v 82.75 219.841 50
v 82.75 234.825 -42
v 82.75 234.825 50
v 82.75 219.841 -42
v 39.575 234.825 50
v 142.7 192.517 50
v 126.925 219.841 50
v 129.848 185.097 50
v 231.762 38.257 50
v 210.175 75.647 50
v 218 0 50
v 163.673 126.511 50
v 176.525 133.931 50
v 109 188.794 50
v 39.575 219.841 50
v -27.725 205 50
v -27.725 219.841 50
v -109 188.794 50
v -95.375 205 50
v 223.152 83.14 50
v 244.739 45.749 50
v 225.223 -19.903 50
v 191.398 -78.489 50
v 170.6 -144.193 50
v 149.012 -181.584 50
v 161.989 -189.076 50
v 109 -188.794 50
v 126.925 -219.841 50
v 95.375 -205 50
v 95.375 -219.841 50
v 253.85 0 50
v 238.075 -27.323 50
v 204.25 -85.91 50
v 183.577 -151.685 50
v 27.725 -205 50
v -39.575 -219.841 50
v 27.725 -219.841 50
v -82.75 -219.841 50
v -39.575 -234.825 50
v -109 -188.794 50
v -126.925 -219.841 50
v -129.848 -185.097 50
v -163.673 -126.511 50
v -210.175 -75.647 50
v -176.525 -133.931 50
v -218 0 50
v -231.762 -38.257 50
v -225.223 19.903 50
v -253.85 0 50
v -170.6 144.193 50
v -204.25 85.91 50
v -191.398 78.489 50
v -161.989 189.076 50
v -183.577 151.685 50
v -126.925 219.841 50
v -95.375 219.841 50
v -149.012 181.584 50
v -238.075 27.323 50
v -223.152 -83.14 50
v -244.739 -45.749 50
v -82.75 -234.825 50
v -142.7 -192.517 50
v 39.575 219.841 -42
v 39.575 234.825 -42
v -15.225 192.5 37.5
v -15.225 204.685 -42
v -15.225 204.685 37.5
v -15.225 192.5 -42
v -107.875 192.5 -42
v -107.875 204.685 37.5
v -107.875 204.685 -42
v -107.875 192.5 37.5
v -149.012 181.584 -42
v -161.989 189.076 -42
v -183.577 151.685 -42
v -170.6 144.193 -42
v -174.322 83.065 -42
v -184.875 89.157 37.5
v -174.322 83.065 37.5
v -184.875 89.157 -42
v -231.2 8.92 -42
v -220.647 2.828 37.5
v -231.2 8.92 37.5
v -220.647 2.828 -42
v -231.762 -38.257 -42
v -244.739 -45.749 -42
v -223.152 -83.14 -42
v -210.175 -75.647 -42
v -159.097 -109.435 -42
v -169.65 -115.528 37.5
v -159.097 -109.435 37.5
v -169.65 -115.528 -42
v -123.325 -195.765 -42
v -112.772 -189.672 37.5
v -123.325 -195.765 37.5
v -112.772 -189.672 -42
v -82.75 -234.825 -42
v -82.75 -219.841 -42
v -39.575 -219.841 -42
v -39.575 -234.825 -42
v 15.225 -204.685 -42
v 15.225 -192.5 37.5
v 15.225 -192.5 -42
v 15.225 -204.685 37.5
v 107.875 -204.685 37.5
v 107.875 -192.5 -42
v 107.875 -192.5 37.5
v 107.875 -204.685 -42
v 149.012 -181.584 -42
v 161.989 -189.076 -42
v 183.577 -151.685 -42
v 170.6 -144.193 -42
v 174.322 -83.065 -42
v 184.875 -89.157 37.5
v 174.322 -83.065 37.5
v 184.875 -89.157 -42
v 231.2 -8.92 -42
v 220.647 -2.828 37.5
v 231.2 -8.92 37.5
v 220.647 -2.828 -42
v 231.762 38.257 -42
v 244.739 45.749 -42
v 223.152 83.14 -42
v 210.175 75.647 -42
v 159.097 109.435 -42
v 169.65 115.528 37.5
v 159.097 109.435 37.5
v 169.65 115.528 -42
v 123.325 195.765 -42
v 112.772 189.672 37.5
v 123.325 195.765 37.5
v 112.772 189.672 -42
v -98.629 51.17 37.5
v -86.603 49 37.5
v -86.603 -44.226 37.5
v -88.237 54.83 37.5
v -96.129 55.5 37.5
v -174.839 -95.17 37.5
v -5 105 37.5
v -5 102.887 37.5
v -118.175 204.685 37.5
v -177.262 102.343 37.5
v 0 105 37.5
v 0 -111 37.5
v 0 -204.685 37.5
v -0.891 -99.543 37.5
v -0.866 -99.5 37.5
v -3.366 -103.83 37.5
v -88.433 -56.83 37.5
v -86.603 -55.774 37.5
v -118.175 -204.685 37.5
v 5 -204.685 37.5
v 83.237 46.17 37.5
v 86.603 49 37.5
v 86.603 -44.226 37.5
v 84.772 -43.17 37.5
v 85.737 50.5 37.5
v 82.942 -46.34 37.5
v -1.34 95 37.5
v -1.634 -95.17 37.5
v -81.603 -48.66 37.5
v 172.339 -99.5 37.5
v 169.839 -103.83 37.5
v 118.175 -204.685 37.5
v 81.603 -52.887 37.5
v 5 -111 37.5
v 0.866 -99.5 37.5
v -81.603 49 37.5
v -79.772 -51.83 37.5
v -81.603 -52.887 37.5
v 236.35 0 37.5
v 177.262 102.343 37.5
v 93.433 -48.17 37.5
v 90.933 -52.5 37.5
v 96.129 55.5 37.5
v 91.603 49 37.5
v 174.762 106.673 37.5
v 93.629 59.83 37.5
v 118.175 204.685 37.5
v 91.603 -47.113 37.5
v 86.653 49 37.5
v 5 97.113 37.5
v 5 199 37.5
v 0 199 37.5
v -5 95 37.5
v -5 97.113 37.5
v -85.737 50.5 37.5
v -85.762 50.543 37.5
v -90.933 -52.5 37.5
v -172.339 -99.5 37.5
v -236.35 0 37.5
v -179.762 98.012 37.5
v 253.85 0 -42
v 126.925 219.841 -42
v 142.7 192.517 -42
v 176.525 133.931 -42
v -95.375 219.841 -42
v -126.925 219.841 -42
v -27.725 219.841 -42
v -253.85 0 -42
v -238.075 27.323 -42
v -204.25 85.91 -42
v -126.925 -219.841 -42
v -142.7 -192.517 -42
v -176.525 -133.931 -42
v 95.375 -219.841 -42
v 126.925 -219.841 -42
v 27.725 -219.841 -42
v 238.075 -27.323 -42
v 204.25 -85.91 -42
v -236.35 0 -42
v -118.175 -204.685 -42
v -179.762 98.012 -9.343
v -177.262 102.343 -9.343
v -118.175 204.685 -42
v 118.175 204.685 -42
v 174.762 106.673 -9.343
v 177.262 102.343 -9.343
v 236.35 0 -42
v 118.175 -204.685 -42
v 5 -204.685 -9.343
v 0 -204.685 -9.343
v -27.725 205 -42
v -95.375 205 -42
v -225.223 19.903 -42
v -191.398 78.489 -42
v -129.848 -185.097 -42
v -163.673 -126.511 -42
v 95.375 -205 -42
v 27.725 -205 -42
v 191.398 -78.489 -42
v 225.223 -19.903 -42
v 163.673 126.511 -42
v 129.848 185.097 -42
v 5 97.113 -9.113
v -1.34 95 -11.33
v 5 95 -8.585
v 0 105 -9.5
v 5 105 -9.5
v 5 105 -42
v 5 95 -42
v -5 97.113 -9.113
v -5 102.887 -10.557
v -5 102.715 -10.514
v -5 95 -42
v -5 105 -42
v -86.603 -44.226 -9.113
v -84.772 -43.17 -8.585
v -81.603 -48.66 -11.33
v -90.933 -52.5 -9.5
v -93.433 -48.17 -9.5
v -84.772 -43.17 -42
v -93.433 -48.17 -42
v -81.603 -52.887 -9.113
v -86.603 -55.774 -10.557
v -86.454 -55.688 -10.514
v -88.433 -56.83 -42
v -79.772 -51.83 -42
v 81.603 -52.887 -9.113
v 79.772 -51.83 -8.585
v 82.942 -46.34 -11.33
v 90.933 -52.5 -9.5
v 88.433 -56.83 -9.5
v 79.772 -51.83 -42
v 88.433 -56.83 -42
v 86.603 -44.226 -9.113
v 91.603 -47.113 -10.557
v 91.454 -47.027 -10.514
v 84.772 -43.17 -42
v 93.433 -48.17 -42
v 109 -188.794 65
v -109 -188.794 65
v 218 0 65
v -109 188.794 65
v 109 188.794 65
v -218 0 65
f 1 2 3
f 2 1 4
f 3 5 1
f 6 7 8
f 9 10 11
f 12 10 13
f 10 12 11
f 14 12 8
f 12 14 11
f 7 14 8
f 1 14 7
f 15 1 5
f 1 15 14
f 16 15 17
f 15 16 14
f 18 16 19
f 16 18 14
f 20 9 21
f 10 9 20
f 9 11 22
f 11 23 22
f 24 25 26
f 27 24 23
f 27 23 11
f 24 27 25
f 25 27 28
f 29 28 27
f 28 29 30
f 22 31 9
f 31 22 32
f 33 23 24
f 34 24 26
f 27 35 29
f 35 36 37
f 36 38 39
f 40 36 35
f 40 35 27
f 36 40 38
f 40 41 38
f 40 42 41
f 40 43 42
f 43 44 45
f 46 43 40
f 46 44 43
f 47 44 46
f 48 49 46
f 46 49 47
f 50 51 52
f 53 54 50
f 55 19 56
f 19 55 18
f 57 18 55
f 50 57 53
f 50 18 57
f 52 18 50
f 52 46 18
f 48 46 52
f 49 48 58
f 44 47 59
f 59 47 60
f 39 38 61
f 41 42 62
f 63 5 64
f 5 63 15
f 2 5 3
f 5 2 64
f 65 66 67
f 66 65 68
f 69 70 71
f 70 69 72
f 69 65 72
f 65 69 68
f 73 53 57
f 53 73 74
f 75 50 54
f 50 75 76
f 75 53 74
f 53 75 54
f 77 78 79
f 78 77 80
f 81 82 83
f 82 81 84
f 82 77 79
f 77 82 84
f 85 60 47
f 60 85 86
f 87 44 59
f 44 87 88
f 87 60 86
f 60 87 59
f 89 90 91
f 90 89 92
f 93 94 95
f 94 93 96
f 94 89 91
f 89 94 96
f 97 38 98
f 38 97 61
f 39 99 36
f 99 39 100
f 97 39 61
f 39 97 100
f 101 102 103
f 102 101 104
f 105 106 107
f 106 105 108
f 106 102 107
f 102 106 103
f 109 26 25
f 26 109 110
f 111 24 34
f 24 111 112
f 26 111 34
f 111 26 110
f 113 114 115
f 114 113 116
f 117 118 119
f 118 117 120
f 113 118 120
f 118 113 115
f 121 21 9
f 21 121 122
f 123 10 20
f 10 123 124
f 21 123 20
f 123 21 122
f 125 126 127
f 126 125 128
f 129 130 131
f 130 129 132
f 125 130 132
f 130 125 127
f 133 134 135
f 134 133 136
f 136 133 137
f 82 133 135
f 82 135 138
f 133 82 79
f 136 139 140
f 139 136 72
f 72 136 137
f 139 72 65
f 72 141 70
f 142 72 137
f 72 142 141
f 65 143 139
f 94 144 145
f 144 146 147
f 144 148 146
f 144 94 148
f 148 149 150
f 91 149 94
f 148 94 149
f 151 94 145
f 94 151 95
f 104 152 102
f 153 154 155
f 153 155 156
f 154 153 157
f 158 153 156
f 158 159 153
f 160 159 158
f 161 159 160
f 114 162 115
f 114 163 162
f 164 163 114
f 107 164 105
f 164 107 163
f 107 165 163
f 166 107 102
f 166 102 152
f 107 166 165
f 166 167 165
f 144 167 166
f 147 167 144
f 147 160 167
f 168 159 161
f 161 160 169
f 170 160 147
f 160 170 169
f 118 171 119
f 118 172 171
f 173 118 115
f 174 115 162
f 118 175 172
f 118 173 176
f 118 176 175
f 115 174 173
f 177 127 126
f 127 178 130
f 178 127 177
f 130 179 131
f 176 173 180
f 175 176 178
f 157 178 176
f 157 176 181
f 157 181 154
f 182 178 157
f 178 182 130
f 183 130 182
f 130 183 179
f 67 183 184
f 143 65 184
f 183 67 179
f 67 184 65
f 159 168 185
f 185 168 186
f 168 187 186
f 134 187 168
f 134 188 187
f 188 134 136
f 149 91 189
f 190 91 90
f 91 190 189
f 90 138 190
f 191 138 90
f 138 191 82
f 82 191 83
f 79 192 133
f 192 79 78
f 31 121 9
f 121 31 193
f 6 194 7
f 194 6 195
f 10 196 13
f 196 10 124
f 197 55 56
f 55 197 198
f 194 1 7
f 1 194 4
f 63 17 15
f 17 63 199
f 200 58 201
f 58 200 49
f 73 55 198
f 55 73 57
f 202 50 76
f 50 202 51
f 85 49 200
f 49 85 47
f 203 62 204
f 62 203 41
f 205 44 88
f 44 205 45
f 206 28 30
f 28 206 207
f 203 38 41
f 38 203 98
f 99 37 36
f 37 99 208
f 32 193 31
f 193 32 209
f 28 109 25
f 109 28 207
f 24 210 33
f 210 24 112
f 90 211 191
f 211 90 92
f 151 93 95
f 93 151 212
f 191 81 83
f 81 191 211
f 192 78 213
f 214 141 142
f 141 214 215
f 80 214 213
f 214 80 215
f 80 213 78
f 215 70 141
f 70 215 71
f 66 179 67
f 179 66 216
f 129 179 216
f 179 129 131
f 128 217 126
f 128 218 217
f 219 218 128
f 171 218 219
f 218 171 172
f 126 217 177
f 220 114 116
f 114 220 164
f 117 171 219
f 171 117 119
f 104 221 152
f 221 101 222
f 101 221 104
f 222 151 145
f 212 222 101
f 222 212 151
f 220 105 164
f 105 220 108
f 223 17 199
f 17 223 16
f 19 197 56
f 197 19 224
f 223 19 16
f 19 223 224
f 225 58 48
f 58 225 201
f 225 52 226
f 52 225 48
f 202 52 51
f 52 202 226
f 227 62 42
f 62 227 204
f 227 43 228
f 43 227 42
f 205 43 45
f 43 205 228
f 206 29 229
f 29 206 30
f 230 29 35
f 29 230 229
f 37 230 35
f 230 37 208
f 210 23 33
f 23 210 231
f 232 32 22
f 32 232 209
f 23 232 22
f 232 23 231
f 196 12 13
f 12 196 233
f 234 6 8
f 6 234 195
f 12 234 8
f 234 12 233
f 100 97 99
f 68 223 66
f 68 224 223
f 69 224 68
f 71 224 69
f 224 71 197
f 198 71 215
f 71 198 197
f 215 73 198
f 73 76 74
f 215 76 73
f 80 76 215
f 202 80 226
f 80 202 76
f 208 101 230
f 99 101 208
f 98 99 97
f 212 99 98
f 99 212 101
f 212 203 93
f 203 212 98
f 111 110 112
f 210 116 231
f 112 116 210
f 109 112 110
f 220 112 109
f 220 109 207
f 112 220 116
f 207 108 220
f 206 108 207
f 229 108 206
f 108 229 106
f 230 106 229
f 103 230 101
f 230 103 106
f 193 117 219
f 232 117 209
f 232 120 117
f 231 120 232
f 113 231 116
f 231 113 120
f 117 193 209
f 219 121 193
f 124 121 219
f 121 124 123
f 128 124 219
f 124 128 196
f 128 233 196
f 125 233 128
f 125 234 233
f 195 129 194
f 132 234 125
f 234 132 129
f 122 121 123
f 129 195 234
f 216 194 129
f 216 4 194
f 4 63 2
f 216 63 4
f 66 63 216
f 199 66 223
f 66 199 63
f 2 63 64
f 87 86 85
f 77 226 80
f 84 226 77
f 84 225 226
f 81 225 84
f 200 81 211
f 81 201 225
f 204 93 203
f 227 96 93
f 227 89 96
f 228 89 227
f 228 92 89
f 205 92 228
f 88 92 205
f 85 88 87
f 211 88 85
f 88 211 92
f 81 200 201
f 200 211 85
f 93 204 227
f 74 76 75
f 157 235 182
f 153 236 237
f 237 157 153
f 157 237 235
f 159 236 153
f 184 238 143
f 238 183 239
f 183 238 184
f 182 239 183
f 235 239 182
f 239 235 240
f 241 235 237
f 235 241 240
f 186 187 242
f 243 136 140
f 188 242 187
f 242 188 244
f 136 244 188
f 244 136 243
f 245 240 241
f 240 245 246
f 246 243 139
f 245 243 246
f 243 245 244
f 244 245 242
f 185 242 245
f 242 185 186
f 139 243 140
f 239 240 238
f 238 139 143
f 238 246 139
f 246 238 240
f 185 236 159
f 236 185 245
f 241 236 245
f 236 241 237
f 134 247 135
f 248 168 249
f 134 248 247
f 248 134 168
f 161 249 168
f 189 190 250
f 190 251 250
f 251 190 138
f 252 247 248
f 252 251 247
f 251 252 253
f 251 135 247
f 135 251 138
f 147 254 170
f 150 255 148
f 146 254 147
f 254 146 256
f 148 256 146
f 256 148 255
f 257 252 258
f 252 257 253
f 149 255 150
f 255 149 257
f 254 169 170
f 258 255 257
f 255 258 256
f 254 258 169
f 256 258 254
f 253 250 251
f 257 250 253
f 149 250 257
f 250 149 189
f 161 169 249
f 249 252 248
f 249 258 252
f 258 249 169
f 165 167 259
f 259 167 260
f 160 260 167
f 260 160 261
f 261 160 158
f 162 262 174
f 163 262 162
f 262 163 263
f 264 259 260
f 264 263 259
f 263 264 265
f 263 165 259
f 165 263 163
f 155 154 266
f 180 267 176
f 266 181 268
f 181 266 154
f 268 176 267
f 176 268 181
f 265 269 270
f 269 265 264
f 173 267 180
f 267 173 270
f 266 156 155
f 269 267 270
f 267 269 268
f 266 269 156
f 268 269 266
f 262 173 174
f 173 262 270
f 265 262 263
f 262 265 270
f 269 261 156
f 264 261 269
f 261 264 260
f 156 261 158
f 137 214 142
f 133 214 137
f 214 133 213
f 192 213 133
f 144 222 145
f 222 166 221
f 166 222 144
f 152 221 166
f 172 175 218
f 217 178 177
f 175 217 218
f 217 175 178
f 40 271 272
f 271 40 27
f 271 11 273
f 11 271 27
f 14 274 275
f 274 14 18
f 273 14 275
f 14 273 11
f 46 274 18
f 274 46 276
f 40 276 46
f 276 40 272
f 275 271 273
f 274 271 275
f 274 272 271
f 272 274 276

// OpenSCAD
// Heroscape Terrain Hex Tile Generator

//Type of tile to generate
HexName = "single"; // [single,pair,row3,row4,row5,tri3,diam4,block6,rnd7]

// Type of tile to make
HexType = "ground"; // [ground,water]

// Generate supports for the underside of the tile face
MakeSupports = "yes"; // [yes,no]

// Use a file to generate a texture for the raised hex center
UseFaceTextureFile = "no"; // [yes,no]

// Texture file to use for a ground tile face, 150x150 or larger
FileName = "image-surface.dat"; // [image_surface:150x150]


// Creates a 'clip' that merges the edges of two adjacent tiles
// Parameters:
//	face: Which face of the tile to clip, counting CCW from +X (1-5)
//	full: Whether to draw a full-height clip or not (1:full, 0:half)
module hexclip(face,type)
{
  rotate([0,0,((face-1)*60)-60])
  if (type == "ground")
  {
    translate([-126.925,199.84,-42])
    cube([253.85,40,92]);
  } else {
    translate([-126.925,199.84,0])
    cube([253.85,40,50]);
  }
}

module hex_rim(top)
{
  difference(){
    union(){
      if (top==1)
      {
        translate([0,0,37.5])
        cylinder(12.5,253.75,253.75,$fn=6);
      }
      translate([0,0,25])
      linear_extrude(height=50,center=true, convexity=10)
      {
        difference ()
        {
          circle(253.85,$fn=6);
          circle(236.35,$fn=6);
        };
      }
      for (a = [0:5])
      {
        rotate([0,0,a*60])
        {
          translate([39.575,219.825,0]) {cube([43.175,15,50]);}
          translate([-107.875,192.5,0]) {cube([92.65,20,50]);}
        }
      }
    }
    for (a = [0:5])
    {
      rotate([0,0,a*60])
      {
        translate([-95.375,205,-25]) {cube([67.65,30,100]);}
      }
    }
  }
}

module HexSupports()
{
  for (x=[0:120:240])
  {
    rotate([0,0,x])
    translate([0,100,0])
    {
      translate([-5,-5,-42])
      cube([10,10,80]);
      for (i=[-30:120:300])
      rotate([0,0,i])
      rotate([90,0,0])
      linear_extrude(5)
      polygon([[0,-12],[100,38],[0,38]],[[0,1,2]]);
    }
  }
  for (x=[60:120:300])
  {
    rotate([0,0,x])
    translate([0,210,0])
    rotate([90,0,-90])
    linear_extrude(5)
    polygon([[0,-12],[100,38],[0,38]],[[0,1,2]]);
  }
}

module TerrainHex()
{
  hex_rim(1);
  if (HexType == "ground")
  {
    translate([0,0,-42])
    hex_rim(0);
    if (UseFaceTextureFile == "yes")
    {
      intersection()
      {
        translate([0,0,0])
        cylinder(100,218,218,$fn=6);
        translate([-225,-225,50])
        scale([3,3,20])		// use this scaling on Thingiverse
        surface(file=FileName, convexity=5);
      }
    } else {
      translate([0,0,45])
      cylinder(20,218,218,$fn=6);
    }
    if (MakeSupports == "yes") HexSupports();
  }
}

module TerrainRow(num)
{
  for (i=[1:num])
  {
    translate([0,(i-1)*439.68,0])
    {
      if (i>1) {hexclip(5,HexType);}
      TerrainHex();
    }
  }
}

module TriHex()
{
  TerrainRow(2);
  rotate([0,0,60])
  {
    translate([0,439.68,0])
    rotate([0,0,-60])
    {
      TerrainHex();
      hexclip(1,HexType);
      hexclip(6,HexType);
    }
  }
}

module DblRow(len)
{
  TerrainRow(len);
  rotate([0,0,60])
  translate([0,439.68,0])
  rotate([0,0,-60])
  for (i=[0:(len-1)])
  {
    translate([0,i*439.68,0])
    {
      TerrainHex();
      hexclip(6,HexType);
      if (i<(len-1)) {hexclip(1,HexType);}
      if (i>0) {hexclip(5,HexType);}
    }
  }
}

module WrapCenter(index)
{
  if (index<6)
  {
    translate([0,439.68,0])
    {
      TerrainHex();
      hexclip(5,HexType);
      if (index>0) {hexclip(6,HexType);}
      if (index==0)
      {rotate([0,0,-120]) {WrapCenter(index+1);}}
      else
      {rotate([0,0,-60]) {WrapCenter(index+1);}}
    }
  } else {hexclip(2,HexType);}
}

module SevenHex()
{
  TerrainHex();
  WrapCenter(0);
}

module WaterHex()
{
  hex_rim(1);
}

module Water2Hex()
{
  hex_rim(1);
  translate([0,439.68,0])
  hex_rim(1);
  translate([-126.925,199.84,0])
  cube([253.85,40,50]);
}

module Water3Hex()
{
 Water2Hex();
 rotate([0,0,60])
 {
   translate([0,439.68,0])
   hex_rim(1);
   translate([-126.925,199.84,0])
   cube([253.85,40,50]);
   translate([0,439.68,0])
   rotate([0,0,-120])
   {
     translate([-126.925,199.84,0])
     cube([253.85,40,50]);
   }
 }
}

color("DarkGray")
{
  if (HexType == "ground")
  {
    if (HexName == "single") {TerrainRow(1);}
    else if (HexName == "pair") {TerrainRow(2);}
    else if (HexName == "row3") {TerrainRow(3);}
    else if (HexName == "row4") {TerrainRow(4);}
    else if (HexName == "row5") {TerrainRow(5);}
    else if (HexName == "tri3") {TriHex();}
    else if (HexName == "diam4") {DblRow(2);}
    else if (HexName == "block6") {DblRow(3);}
    else if (HexName == "rnd7") {SevenHex();}
    else {}
  }
  else
  {
    rotate([0,180,0])
    {
      if (HexName == "single") {TerrainRow(1);}
      else if (HexName == "pair") {TerrainRow(2);}
      else if (HexName == "row3") {TerrainRow(3);}
      else if (HexName == "row4") {TerrainRow(4);}
      else if (HexName == "row5") {TerrainRow(5);}
      else if (HexName == "tri3") {TriHex();}
      else if (HexName == "diam4") {DblRow(2);}
      else if (HexName == "block6") {DblRow(3);}
      else if (HexName == "rnd7") {SevenHex();}
      else {}
    }
  }
}
